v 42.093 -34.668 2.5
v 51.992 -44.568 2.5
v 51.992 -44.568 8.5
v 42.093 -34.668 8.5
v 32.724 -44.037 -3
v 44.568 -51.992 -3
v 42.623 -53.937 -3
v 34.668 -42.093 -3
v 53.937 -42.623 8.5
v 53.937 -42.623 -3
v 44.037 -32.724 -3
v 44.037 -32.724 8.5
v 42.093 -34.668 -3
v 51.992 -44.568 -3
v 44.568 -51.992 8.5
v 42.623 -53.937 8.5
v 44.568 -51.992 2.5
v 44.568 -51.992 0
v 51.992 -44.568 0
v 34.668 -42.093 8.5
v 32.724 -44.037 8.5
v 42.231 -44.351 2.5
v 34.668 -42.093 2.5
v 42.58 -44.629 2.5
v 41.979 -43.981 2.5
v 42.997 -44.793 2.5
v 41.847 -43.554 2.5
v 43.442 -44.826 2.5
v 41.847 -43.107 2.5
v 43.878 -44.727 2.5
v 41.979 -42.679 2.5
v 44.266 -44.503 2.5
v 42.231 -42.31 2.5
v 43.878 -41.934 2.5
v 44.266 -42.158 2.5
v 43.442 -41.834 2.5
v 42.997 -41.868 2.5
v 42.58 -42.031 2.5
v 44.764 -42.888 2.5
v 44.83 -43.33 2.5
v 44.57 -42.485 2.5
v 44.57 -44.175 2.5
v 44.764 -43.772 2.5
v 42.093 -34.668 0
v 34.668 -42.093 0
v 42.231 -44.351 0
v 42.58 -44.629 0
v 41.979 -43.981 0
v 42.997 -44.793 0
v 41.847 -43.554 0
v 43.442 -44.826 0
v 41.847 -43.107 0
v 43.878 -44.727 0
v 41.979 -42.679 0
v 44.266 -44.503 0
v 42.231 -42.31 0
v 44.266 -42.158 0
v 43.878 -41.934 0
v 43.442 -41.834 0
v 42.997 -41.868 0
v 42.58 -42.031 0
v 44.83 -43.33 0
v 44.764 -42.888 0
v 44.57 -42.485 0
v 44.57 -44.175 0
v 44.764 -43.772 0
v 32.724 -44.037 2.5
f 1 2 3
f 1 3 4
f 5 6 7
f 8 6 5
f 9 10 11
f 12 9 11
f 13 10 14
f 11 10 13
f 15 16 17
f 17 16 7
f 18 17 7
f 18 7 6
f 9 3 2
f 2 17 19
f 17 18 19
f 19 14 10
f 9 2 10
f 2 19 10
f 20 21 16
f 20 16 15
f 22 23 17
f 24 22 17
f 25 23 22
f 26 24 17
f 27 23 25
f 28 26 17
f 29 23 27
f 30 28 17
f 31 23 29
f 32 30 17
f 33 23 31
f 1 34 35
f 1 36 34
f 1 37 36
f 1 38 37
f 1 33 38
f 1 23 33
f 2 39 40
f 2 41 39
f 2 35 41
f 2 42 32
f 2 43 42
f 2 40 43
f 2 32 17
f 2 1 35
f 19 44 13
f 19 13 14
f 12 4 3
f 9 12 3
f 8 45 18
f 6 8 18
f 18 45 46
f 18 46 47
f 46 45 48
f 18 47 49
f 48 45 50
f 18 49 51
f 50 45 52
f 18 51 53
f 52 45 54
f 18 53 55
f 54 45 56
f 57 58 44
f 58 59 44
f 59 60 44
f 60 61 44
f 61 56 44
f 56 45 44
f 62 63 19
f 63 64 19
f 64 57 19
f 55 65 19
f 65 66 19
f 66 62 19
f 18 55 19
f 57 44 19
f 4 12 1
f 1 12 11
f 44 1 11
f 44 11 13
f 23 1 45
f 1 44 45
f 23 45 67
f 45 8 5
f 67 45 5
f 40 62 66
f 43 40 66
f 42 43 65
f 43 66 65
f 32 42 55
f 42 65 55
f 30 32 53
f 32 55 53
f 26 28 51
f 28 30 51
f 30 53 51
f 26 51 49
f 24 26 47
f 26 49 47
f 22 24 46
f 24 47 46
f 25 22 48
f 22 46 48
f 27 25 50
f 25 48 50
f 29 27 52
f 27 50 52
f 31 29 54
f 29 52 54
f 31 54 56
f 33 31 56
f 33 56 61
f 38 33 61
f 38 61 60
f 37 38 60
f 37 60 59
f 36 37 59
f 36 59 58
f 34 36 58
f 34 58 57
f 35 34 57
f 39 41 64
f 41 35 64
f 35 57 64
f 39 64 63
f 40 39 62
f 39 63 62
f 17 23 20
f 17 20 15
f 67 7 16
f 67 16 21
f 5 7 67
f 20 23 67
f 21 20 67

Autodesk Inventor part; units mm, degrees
ref_plane "YZ Plane" through (0, 0, 0) normal (1, 0, 0) x (0, 1, 0)
ref_plane "XZ Plane" through (0, 0, 0) normal (0, 1, 0) x (-1, 0, 0)
ref_plane "XY Plane" through (0, 0, 0) normal (0, 0, 1) x (1, 0, 0)
sketch "Sketch1" plane through (0, 0, 0) normal (0, 0, 1) x (1, 0, 0)
  circle A0 centre (43.3303, -43.3303) radius 1.5 projected
  circle A1 centre (32.0698, -32.0698) radius 1.5 projected
  arc A2 (2.3181, 4.753) -> (-4.753, -2.3181) centre (-1.2174, 1.2174) ccw projected
  line L0 (-4.753, -2.3181) -> (44.7445, -51.8156) projected
  line L1 (44.7445, -51.8156) -> (51.8156, -44.7445) projected
  line L2 (51.8156, -44.7445) -> (2.3181, 4.753) projected
  line L3 (44.7445, -51.8156) -> (34.845, -41.9161)
  line L4 (44.7445, -51.8156) -> (51.8156, -44.7445)
  line L5 (51.8156, -44.7445) -> (41.9161, -34.845)
  line L6 (34.845, -41.9161) -> (41.9161, -34.845)
  line L7 (44.7445, -51.8156) -> (42.6232, -53.9369)
  line L8 (42.6232, -53.9369) -> (32.7237, -44.0374)
  line L9 (32.7237, -44.0374) -> (34.845, -41.9161)
  line L10 (51.8156, -44.7445) -> (53.9369, -42.6232)
  line L11 (53.9369, -42.6232) -> (44.0374, -32.7237)
  line L12 (44.0374, -32.7237) -> (41.9161, -34.845)
  line L13 (44.391, -52.1691) -> (34.4915, -42.2697)
  line L14 (52.1691, -44.391) -> (42.2697, -34.4915)
  point P0 (0, 0)
  dimension "d1" = 7
  dimension "d2" = 3
  dimension "d3" = 3
  dimension "d10" = 0.5
  dimension "d11" = 0.5
extrude "Extrusion1" add sketch "Sketch1" along normal blind 2.5 contours L12 L14 L10 L2 | L2 L1 L0 L6 | L0 L7 L13 L9 | L12 L11 L10 L14 | L13 L7 L8 L9
sketch "Sketch2" plane through (0, 0, 0) normal (0, 0, -1) x (-1, 0, 0)
  line L0 (-32.7237, -44.0374) -> (-42.6232, -53.9369) projected
  line L1 (4.753, -2.3181) -> (-44.7445, -51.8156) projected
  line L2 (-42.6232, -53.9369) -> (-44.7445, -51.8156) projected
  line L3 (-44.0374, -32.7237) -> (-32.7237, -44.0374) projected
  line L4 (-53.9369, -42.6232) -> (-44.0374, -32.7237) projected
  line L5 (-51.8156, -44.7445) -> (-2.3181, 4.753) projected
  line L6 (-51.8156, -44.7445) -> (-53.9369, -42.6232) projected
  line L7 (-32.7237, -44.0374) -> (-34.845, -41.9161)
  line L8 (-44.0374, -32.7237) -> (-32.7237, -44.0374) projected
  line L9 (-44.0374, -32.7237) -> (-41.9161, -34.845)
  line L10 (-34.6683, -42.0929) -> (-44.5677, -51.9924)
  line L11 (-42.0929, -34.6683) -> (-51.9924, -44.5677)
  point P0 (0, 0)
  dimension "d12" = 0.25
  dimension "d13" = 0.25
extrude "Extrusion2" add sketch "Sketch2" along normal blind 3 contours L0 L2 L10 L3 | L11 L6 L4 L3
sketch "Sketch3" plane through (0, 0, 2.5) normal (0, 0, 1) x (1, 0, 0)
  line L0 (-4.753, -2.3181) -> (44.7445, -51.8156) projected
  line L1 (42.6232, -53.9369) -> (44.7445, -51.8156) projected
  line L2 (32.7237, -44.0374) -> (42.6232, -53.9369) projected
  line L3 (53.9369, -42.6232) -> (44.0374, -32.7237) projected
  line L4 (51.8156, -44.7445) -> (53.9369, -42.6232) projected
  line L5 (51.8156, -44.7445) -> (2.3181, 4.753) projected
  line L6 (41.9161, -34.845) -> (44.0374, -32.7237)
  line L7 (51.9924, -44.5677) -> (42.0929, -34.6683) projected
  line L8 (34.6683, -42.0929) -> (44.5677, -51.9924) projected
  line L9 (34.6683, -42.0929) -> (32.7237, -44.0374)
  line L10 (44.0374, -32.7237) -> (32.7237, -44.0374) projected
  point P0 (0, 0)
extrude "Extrusion3" add sketch "Sketch3" along normal blind 6 contours L8 L1 L2 L9 | L6 L3 L4 L7
properties part number "eye_cam_arm_brace"
